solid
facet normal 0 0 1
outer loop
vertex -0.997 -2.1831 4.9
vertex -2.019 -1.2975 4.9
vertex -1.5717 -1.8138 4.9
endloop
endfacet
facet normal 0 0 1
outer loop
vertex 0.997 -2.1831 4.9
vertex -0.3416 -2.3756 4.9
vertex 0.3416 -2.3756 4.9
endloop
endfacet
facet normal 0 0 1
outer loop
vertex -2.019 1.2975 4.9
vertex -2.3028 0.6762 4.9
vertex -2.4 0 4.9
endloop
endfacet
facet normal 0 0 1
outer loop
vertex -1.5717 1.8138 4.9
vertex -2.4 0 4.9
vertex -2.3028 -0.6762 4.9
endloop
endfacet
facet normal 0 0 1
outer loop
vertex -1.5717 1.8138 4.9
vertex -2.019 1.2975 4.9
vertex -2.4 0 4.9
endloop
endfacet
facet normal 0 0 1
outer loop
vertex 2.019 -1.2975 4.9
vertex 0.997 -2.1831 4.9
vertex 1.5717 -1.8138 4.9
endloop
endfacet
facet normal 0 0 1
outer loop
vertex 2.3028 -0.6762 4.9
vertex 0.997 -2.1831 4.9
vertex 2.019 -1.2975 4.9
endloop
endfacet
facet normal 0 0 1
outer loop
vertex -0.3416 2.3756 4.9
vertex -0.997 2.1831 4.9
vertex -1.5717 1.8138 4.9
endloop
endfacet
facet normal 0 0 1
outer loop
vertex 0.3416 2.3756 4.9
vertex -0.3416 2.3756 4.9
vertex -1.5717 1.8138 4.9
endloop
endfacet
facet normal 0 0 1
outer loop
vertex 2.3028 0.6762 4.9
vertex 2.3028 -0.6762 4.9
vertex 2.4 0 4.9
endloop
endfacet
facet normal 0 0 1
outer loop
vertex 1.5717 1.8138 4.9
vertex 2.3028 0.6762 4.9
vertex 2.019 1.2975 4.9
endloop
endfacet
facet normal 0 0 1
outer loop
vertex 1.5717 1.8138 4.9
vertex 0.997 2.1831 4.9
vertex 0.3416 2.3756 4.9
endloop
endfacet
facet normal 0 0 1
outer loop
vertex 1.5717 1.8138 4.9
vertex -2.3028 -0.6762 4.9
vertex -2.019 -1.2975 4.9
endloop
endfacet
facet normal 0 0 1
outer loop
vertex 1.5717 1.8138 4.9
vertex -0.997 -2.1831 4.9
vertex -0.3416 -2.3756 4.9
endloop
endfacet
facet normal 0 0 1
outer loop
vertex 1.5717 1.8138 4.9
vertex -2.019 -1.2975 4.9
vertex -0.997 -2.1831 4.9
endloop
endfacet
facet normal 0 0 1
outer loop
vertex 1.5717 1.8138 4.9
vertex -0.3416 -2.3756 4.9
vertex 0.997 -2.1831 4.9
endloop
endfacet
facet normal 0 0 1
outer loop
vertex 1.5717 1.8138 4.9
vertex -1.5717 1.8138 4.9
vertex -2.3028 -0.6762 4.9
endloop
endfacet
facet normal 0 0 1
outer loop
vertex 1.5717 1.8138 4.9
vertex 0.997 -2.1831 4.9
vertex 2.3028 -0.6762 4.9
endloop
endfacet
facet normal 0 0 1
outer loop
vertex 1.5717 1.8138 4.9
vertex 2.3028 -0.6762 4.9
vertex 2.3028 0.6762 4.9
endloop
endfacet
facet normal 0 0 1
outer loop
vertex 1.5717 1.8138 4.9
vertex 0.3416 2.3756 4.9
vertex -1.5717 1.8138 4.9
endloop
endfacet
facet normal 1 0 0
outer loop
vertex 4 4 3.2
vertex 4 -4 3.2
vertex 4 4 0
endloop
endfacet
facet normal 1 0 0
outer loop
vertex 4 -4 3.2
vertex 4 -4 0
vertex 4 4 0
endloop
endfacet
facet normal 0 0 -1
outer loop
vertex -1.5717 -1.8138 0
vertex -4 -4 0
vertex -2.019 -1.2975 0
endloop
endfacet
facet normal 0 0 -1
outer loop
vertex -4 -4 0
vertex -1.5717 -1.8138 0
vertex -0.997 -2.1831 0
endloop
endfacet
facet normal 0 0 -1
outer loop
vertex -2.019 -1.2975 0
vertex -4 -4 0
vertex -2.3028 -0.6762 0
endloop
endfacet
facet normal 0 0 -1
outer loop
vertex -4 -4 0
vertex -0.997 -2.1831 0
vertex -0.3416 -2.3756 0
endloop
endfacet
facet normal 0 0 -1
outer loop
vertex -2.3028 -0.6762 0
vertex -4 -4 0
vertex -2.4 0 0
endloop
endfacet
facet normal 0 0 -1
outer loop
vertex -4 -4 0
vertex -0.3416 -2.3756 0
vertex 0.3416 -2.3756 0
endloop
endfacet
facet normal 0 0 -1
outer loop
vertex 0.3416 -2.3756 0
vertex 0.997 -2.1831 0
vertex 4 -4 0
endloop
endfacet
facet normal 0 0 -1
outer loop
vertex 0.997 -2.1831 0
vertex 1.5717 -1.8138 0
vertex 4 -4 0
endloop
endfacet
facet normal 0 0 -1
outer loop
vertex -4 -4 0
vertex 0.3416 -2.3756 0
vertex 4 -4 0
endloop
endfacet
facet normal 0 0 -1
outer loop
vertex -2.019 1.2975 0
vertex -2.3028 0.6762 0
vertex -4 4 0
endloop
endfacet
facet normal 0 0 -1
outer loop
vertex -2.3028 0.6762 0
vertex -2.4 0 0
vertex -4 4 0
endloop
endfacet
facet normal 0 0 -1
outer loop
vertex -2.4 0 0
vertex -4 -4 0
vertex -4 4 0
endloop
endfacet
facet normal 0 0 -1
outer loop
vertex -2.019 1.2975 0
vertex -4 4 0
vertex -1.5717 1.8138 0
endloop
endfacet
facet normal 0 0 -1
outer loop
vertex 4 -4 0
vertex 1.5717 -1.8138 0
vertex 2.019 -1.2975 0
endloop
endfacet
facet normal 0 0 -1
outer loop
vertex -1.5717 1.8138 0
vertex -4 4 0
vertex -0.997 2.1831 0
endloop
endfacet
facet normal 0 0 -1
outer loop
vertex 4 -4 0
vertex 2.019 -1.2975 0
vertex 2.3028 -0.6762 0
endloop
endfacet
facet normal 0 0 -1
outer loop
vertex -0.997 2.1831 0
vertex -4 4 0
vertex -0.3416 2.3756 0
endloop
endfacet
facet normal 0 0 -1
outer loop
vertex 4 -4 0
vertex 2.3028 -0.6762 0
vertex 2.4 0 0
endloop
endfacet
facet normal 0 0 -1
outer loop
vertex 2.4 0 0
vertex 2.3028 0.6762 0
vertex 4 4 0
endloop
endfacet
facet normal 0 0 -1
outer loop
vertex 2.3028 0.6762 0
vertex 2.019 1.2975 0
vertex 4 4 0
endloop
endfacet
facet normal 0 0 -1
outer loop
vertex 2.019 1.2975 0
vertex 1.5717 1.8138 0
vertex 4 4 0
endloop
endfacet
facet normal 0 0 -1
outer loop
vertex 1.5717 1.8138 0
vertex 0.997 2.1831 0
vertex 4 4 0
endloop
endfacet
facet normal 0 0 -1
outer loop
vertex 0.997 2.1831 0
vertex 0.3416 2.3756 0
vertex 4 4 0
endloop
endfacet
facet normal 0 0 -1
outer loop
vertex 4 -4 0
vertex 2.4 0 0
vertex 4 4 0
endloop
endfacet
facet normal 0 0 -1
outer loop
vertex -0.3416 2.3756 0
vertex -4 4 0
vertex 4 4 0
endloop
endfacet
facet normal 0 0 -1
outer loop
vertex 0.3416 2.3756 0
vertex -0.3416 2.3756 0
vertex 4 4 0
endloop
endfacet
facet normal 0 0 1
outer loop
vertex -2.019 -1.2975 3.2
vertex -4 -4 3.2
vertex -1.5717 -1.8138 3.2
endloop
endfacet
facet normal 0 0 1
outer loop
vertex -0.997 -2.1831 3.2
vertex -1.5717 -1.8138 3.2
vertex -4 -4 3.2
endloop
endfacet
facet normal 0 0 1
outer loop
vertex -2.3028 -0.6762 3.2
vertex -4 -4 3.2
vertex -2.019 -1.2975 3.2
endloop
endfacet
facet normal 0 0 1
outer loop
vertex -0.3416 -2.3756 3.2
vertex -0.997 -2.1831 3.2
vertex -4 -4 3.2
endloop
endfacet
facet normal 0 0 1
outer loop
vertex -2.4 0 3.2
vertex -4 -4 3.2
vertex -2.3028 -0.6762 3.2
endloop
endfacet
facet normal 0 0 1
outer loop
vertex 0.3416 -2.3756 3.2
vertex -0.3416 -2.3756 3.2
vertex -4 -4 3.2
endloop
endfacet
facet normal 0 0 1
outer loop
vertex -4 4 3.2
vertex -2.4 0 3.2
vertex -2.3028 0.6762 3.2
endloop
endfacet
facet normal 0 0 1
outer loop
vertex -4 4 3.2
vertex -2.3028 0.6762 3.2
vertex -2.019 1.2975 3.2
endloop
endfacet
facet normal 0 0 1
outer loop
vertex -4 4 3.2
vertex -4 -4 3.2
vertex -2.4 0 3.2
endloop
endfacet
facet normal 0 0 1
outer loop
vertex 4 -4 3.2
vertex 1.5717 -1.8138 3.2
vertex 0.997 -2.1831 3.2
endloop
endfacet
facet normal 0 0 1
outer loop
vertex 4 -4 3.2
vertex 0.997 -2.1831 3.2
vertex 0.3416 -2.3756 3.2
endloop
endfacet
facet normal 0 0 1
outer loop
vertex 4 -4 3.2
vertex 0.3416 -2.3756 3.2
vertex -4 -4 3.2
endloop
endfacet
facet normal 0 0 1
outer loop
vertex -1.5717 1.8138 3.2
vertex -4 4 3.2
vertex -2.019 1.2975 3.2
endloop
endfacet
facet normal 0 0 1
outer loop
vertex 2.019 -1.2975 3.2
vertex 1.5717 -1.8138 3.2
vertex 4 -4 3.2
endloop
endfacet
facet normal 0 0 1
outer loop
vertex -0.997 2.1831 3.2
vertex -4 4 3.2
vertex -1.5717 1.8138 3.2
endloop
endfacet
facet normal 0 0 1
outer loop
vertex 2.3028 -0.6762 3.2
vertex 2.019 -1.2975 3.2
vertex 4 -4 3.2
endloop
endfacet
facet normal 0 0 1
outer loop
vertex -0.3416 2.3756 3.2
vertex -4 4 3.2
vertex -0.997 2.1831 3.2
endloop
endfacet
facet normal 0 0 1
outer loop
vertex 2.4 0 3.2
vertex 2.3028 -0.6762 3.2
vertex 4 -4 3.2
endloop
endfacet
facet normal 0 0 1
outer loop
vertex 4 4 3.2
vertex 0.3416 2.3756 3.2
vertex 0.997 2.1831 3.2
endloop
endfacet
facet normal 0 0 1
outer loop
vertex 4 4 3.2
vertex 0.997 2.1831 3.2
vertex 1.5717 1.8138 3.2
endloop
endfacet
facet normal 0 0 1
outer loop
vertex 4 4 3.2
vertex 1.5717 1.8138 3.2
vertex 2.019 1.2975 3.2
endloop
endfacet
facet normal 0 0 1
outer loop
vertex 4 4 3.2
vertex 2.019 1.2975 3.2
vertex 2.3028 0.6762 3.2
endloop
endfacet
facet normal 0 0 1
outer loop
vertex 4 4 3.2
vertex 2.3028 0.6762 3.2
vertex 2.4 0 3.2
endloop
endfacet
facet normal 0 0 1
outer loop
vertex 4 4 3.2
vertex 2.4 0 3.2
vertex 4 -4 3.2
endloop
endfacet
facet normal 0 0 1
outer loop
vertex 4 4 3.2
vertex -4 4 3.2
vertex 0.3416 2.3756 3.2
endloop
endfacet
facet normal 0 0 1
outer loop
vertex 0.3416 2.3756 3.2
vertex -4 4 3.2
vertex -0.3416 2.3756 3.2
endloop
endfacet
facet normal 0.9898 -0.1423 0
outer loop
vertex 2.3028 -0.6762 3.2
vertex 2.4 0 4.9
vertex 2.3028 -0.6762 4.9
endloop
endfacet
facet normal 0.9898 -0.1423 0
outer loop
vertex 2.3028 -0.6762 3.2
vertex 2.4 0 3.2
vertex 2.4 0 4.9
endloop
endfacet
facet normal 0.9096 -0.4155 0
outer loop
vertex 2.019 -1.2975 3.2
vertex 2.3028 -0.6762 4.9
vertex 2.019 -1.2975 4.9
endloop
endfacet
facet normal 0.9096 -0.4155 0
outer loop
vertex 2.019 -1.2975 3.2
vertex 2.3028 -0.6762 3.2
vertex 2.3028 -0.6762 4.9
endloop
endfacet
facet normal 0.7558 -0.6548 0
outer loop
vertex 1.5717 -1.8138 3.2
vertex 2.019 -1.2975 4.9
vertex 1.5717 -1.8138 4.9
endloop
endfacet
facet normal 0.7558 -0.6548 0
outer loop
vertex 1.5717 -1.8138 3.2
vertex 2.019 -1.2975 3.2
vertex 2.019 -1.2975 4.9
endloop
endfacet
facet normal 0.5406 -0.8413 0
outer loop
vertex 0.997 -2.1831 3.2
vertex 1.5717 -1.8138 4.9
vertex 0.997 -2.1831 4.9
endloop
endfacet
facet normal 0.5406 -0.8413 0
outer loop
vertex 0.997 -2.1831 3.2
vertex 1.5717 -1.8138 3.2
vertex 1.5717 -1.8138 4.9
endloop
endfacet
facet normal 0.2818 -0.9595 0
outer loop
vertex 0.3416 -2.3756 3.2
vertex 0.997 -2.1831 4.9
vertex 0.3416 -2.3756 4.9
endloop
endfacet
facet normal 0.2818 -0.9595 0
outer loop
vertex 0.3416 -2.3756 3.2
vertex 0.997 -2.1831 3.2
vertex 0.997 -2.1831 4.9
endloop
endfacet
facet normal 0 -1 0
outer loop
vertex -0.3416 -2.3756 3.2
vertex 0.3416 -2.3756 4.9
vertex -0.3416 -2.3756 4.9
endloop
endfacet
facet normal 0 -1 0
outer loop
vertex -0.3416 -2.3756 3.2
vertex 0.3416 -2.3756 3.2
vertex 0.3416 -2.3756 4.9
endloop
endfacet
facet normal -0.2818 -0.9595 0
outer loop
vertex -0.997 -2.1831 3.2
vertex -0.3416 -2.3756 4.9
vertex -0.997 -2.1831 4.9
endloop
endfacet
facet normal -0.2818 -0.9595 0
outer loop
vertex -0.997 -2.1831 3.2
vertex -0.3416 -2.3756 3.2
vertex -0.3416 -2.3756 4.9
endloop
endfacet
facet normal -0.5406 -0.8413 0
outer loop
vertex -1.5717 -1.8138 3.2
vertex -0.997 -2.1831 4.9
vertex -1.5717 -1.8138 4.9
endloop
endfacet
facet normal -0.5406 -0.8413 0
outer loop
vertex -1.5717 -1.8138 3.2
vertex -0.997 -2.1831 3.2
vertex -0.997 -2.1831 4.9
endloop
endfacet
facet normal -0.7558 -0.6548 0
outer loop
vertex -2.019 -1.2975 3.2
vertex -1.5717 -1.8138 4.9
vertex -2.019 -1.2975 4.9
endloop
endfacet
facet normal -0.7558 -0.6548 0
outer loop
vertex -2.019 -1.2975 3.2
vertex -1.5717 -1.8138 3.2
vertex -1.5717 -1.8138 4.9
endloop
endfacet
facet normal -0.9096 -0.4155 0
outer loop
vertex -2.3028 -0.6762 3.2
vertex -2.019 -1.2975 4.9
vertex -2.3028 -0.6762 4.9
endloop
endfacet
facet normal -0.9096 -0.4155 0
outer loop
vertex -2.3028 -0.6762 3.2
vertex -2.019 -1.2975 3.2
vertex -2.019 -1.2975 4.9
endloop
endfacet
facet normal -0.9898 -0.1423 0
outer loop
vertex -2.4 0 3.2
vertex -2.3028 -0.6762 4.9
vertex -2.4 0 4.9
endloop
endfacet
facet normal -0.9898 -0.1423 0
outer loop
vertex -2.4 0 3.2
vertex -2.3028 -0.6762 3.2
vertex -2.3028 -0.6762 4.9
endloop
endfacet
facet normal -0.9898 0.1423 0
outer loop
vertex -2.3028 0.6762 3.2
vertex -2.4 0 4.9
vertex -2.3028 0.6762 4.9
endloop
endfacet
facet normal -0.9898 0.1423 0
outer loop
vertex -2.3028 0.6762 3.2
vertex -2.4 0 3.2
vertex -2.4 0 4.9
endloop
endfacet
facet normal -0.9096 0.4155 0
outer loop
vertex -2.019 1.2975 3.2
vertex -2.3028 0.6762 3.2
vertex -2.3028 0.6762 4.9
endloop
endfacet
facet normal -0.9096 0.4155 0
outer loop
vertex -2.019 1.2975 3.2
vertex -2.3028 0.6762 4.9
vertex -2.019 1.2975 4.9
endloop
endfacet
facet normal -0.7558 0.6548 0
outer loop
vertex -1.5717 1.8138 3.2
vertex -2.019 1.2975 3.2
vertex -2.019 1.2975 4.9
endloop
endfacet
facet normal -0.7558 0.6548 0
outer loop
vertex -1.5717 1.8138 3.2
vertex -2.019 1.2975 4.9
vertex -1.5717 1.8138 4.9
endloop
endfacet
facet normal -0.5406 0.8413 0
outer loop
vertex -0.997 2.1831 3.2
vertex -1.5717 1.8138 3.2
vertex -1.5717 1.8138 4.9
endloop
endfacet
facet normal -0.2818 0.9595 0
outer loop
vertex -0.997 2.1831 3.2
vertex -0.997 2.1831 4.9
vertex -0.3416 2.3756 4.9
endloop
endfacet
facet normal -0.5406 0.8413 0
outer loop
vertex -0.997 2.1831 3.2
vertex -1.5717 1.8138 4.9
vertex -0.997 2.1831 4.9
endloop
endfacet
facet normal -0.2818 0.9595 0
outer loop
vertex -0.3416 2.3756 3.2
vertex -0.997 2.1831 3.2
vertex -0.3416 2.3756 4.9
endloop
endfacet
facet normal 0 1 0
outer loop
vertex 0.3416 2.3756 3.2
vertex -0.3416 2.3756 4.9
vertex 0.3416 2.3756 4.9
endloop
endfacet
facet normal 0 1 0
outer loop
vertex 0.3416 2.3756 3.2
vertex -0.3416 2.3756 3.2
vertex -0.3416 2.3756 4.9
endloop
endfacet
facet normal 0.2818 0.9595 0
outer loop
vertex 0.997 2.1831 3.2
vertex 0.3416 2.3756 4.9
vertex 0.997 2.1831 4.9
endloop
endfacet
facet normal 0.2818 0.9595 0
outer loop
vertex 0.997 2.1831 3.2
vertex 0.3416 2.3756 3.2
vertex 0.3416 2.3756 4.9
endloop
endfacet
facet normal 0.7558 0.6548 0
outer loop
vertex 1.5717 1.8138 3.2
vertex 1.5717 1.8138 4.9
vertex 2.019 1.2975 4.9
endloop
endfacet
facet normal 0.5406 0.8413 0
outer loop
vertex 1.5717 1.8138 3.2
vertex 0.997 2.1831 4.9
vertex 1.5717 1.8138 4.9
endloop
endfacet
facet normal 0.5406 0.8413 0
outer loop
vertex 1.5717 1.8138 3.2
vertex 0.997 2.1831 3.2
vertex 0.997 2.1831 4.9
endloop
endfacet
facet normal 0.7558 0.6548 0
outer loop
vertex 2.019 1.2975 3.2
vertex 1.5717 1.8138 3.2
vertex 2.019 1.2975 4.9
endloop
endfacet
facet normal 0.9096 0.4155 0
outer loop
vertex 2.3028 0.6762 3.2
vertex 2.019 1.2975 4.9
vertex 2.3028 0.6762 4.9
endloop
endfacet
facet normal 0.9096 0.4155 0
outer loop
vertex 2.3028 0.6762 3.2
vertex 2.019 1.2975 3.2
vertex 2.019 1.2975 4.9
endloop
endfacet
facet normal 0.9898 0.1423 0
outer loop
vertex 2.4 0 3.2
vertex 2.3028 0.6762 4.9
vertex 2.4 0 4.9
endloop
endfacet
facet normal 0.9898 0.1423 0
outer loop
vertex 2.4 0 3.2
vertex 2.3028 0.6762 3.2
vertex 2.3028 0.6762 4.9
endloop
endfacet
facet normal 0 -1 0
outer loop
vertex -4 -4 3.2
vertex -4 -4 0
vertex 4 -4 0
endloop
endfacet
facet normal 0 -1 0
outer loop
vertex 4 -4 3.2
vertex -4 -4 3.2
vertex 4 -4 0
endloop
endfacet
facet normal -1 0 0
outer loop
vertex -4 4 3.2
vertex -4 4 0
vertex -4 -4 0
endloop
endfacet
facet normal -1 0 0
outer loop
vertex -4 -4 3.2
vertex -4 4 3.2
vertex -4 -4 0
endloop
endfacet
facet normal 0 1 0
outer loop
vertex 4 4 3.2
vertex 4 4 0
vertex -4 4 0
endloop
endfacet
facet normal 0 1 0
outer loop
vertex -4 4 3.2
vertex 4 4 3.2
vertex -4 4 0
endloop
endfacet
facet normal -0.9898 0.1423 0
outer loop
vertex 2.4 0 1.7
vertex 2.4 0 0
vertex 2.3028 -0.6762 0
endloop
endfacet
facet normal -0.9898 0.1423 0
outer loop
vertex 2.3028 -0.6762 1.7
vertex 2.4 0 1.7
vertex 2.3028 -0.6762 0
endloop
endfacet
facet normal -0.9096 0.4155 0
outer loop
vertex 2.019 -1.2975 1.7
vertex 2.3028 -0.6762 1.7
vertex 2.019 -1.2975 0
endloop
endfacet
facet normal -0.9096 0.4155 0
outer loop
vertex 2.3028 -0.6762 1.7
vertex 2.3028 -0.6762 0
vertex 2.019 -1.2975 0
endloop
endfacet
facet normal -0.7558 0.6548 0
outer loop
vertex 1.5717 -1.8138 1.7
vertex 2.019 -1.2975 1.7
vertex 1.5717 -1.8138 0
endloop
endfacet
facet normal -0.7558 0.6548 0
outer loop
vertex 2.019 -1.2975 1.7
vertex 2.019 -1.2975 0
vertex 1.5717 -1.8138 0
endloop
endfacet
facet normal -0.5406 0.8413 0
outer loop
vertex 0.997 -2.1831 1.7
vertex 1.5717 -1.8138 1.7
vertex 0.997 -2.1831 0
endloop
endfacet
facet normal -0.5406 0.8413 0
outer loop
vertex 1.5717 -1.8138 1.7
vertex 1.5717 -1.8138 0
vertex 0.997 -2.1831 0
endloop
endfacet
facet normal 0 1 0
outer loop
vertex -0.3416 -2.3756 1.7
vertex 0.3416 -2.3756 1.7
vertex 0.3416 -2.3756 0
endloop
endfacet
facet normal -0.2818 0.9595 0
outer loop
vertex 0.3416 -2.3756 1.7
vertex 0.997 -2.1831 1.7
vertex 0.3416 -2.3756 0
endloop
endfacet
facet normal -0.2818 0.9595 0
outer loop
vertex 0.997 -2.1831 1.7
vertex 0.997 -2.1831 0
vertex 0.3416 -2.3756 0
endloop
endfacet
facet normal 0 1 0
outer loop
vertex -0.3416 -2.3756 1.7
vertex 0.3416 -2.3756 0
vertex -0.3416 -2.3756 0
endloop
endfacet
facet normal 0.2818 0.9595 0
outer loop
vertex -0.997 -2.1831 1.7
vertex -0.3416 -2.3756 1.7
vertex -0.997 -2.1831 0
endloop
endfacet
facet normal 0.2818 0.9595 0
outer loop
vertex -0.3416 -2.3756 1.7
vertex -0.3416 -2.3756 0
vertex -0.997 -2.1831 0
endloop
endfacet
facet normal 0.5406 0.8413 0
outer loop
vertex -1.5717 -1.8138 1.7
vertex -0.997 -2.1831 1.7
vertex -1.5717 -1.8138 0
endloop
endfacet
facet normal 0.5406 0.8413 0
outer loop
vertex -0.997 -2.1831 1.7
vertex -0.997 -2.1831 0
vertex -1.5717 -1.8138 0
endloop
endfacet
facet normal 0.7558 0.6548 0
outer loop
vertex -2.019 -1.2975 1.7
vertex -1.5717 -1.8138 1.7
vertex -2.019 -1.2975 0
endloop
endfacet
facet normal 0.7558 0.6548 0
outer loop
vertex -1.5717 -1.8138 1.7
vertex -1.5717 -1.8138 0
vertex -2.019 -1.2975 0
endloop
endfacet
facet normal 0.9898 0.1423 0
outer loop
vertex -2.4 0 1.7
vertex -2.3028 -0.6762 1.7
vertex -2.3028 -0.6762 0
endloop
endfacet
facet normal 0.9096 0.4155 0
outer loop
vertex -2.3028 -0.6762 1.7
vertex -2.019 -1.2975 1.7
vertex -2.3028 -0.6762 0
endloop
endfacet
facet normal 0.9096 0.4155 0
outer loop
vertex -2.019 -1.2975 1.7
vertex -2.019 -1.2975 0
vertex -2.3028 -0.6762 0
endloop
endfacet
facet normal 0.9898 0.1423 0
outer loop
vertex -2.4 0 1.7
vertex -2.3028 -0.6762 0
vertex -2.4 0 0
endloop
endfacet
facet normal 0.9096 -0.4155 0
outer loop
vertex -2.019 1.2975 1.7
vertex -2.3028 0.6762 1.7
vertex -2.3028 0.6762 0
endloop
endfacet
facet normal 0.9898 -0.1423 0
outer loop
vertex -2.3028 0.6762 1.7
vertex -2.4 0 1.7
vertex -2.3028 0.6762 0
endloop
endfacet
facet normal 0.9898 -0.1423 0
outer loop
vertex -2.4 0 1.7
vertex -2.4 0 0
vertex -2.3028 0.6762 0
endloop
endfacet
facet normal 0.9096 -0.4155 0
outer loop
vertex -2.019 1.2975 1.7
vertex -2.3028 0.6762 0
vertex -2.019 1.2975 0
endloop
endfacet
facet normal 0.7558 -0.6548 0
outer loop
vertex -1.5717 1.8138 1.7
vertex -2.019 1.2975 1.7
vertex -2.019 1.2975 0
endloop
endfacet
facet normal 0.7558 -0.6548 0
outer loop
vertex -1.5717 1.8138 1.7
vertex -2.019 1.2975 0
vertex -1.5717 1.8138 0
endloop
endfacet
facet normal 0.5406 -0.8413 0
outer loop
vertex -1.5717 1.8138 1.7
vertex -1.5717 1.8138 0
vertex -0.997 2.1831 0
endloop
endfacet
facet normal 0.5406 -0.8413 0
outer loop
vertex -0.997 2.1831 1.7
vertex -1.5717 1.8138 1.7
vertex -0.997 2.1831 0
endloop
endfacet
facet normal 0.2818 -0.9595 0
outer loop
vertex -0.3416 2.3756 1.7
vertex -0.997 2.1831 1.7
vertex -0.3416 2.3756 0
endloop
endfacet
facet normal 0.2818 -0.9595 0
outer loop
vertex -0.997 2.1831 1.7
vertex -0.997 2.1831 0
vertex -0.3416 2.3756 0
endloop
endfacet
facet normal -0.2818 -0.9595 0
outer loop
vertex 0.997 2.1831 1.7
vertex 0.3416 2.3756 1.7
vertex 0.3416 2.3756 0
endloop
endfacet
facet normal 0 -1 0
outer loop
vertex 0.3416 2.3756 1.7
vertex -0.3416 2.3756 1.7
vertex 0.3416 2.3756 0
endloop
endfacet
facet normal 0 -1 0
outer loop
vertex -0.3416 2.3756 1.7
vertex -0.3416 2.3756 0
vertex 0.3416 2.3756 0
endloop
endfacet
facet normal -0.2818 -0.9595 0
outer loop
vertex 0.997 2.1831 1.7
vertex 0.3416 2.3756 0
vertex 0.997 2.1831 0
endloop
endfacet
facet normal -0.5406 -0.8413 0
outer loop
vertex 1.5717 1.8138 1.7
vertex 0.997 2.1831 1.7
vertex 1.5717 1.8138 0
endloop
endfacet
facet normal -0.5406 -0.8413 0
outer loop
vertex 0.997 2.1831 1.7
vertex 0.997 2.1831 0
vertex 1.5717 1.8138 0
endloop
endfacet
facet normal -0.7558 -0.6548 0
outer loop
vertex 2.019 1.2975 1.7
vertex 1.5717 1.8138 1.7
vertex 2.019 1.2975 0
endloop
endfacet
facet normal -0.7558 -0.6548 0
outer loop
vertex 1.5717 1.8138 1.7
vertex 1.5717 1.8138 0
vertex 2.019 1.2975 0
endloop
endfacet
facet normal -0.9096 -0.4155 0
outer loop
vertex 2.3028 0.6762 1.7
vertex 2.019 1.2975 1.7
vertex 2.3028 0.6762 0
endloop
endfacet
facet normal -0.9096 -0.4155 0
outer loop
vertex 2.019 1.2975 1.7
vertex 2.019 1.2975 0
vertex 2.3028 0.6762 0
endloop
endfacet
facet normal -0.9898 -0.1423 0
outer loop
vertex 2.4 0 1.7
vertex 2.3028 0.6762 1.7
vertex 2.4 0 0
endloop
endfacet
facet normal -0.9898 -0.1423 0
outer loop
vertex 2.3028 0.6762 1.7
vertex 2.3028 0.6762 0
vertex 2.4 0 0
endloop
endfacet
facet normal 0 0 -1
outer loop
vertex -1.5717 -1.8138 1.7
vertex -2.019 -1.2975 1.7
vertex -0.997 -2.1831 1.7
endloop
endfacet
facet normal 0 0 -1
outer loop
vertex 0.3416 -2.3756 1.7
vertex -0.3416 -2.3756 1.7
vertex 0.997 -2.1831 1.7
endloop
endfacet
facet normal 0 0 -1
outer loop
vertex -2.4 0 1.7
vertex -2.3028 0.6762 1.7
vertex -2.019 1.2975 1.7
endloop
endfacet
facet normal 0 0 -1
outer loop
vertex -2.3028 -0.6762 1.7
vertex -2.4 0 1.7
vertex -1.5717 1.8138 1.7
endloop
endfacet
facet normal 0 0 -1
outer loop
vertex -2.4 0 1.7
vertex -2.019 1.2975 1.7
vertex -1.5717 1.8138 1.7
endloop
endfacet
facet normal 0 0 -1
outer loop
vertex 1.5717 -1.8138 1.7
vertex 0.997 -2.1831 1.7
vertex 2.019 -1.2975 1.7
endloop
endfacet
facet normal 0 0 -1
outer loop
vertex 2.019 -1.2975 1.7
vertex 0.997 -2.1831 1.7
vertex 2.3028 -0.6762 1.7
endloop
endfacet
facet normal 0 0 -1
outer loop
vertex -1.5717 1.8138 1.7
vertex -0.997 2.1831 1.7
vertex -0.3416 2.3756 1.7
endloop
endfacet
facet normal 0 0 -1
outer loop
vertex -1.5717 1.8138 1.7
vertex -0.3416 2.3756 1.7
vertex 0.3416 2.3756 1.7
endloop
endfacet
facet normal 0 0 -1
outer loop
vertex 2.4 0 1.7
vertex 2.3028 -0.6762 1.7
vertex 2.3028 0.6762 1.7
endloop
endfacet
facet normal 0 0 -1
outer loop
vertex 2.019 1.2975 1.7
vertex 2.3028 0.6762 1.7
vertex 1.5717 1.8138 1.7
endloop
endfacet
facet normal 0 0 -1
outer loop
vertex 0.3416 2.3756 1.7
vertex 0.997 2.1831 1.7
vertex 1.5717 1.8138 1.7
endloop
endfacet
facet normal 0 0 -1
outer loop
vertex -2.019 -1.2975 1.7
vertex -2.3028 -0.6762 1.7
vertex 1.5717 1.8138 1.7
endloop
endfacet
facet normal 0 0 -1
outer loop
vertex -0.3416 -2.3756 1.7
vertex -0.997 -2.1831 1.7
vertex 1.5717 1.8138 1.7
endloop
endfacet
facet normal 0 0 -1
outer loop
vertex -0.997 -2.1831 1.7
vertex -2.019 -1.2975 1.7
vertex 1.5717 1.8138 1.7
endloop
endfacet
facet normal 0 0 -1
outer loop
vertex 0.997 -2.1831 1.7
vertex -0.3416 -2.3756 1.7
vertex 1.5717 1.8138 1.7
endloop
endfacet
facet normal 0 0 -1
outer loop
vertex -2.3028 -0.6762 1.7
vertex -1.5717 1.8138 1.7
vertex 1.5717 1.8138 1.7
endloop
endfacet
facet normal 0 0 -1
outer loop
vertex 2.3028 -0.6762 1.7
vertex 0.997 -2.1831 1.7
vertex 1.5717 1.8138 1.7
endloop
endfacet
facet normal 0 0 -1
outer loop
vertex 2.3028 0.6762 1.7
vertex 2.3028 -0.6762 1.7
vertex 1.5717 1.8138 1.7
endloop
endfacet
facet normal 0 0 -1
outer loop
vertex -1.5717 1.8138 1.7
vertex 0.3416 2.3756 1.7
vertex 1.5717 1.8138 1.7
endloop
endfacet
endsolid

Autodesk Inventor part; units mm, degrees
ref_plane "YZ Plane" through (0, 0, 0) normal (1, 0, 0) x (0, 1, 0)
ref_plane "XZ Plane" through (0, 0, 0) normal (0, 1, 0) x (-1, 0, 0)
ref_plane "XY Plane" through (0, 0, 0) normal (0, 0, 1) x (1, 0, 0)
sketch "Sketch1" plane through (0, 0, 0) normal (0, 0, 1) x (1, 0, 0)
  line L0 (-4, -4) -> (4, -4)
  line L1 (4, -4) -> (4, 4)
  line L2 (4, 4) -> (-4, 4)
  line L3 (-4, 4) -> (-4, -4)
  line L4 (-4, -4) -> (4, 4) construction
  line L5 (4, -4) -> (-4, 4) construction
  circle A0 centre (0, 0) radius 2.4
  dimension "d0" = 8
  dimension "d1" = 8
  dimension "d2" = 4.8
extrude "Extrusion1" add sketch "Sketch1" along normal blind 3.2 contours L3 L2 L1 L0 | A0
extrude "Extrusion2" add sketch "Sketch1" along normal blind 4.9 contours A0
extrude "Extrusion3" cut sketch "Sketch1" along normal blind 1.7 contours A0
pattern_of_one "Rectangular Pattern1"
equation "\"d11\" = d0"
equation "\"d24\" = d0"
properties part number "LEGO Stud 1x1 Transparent Dark Blue"
